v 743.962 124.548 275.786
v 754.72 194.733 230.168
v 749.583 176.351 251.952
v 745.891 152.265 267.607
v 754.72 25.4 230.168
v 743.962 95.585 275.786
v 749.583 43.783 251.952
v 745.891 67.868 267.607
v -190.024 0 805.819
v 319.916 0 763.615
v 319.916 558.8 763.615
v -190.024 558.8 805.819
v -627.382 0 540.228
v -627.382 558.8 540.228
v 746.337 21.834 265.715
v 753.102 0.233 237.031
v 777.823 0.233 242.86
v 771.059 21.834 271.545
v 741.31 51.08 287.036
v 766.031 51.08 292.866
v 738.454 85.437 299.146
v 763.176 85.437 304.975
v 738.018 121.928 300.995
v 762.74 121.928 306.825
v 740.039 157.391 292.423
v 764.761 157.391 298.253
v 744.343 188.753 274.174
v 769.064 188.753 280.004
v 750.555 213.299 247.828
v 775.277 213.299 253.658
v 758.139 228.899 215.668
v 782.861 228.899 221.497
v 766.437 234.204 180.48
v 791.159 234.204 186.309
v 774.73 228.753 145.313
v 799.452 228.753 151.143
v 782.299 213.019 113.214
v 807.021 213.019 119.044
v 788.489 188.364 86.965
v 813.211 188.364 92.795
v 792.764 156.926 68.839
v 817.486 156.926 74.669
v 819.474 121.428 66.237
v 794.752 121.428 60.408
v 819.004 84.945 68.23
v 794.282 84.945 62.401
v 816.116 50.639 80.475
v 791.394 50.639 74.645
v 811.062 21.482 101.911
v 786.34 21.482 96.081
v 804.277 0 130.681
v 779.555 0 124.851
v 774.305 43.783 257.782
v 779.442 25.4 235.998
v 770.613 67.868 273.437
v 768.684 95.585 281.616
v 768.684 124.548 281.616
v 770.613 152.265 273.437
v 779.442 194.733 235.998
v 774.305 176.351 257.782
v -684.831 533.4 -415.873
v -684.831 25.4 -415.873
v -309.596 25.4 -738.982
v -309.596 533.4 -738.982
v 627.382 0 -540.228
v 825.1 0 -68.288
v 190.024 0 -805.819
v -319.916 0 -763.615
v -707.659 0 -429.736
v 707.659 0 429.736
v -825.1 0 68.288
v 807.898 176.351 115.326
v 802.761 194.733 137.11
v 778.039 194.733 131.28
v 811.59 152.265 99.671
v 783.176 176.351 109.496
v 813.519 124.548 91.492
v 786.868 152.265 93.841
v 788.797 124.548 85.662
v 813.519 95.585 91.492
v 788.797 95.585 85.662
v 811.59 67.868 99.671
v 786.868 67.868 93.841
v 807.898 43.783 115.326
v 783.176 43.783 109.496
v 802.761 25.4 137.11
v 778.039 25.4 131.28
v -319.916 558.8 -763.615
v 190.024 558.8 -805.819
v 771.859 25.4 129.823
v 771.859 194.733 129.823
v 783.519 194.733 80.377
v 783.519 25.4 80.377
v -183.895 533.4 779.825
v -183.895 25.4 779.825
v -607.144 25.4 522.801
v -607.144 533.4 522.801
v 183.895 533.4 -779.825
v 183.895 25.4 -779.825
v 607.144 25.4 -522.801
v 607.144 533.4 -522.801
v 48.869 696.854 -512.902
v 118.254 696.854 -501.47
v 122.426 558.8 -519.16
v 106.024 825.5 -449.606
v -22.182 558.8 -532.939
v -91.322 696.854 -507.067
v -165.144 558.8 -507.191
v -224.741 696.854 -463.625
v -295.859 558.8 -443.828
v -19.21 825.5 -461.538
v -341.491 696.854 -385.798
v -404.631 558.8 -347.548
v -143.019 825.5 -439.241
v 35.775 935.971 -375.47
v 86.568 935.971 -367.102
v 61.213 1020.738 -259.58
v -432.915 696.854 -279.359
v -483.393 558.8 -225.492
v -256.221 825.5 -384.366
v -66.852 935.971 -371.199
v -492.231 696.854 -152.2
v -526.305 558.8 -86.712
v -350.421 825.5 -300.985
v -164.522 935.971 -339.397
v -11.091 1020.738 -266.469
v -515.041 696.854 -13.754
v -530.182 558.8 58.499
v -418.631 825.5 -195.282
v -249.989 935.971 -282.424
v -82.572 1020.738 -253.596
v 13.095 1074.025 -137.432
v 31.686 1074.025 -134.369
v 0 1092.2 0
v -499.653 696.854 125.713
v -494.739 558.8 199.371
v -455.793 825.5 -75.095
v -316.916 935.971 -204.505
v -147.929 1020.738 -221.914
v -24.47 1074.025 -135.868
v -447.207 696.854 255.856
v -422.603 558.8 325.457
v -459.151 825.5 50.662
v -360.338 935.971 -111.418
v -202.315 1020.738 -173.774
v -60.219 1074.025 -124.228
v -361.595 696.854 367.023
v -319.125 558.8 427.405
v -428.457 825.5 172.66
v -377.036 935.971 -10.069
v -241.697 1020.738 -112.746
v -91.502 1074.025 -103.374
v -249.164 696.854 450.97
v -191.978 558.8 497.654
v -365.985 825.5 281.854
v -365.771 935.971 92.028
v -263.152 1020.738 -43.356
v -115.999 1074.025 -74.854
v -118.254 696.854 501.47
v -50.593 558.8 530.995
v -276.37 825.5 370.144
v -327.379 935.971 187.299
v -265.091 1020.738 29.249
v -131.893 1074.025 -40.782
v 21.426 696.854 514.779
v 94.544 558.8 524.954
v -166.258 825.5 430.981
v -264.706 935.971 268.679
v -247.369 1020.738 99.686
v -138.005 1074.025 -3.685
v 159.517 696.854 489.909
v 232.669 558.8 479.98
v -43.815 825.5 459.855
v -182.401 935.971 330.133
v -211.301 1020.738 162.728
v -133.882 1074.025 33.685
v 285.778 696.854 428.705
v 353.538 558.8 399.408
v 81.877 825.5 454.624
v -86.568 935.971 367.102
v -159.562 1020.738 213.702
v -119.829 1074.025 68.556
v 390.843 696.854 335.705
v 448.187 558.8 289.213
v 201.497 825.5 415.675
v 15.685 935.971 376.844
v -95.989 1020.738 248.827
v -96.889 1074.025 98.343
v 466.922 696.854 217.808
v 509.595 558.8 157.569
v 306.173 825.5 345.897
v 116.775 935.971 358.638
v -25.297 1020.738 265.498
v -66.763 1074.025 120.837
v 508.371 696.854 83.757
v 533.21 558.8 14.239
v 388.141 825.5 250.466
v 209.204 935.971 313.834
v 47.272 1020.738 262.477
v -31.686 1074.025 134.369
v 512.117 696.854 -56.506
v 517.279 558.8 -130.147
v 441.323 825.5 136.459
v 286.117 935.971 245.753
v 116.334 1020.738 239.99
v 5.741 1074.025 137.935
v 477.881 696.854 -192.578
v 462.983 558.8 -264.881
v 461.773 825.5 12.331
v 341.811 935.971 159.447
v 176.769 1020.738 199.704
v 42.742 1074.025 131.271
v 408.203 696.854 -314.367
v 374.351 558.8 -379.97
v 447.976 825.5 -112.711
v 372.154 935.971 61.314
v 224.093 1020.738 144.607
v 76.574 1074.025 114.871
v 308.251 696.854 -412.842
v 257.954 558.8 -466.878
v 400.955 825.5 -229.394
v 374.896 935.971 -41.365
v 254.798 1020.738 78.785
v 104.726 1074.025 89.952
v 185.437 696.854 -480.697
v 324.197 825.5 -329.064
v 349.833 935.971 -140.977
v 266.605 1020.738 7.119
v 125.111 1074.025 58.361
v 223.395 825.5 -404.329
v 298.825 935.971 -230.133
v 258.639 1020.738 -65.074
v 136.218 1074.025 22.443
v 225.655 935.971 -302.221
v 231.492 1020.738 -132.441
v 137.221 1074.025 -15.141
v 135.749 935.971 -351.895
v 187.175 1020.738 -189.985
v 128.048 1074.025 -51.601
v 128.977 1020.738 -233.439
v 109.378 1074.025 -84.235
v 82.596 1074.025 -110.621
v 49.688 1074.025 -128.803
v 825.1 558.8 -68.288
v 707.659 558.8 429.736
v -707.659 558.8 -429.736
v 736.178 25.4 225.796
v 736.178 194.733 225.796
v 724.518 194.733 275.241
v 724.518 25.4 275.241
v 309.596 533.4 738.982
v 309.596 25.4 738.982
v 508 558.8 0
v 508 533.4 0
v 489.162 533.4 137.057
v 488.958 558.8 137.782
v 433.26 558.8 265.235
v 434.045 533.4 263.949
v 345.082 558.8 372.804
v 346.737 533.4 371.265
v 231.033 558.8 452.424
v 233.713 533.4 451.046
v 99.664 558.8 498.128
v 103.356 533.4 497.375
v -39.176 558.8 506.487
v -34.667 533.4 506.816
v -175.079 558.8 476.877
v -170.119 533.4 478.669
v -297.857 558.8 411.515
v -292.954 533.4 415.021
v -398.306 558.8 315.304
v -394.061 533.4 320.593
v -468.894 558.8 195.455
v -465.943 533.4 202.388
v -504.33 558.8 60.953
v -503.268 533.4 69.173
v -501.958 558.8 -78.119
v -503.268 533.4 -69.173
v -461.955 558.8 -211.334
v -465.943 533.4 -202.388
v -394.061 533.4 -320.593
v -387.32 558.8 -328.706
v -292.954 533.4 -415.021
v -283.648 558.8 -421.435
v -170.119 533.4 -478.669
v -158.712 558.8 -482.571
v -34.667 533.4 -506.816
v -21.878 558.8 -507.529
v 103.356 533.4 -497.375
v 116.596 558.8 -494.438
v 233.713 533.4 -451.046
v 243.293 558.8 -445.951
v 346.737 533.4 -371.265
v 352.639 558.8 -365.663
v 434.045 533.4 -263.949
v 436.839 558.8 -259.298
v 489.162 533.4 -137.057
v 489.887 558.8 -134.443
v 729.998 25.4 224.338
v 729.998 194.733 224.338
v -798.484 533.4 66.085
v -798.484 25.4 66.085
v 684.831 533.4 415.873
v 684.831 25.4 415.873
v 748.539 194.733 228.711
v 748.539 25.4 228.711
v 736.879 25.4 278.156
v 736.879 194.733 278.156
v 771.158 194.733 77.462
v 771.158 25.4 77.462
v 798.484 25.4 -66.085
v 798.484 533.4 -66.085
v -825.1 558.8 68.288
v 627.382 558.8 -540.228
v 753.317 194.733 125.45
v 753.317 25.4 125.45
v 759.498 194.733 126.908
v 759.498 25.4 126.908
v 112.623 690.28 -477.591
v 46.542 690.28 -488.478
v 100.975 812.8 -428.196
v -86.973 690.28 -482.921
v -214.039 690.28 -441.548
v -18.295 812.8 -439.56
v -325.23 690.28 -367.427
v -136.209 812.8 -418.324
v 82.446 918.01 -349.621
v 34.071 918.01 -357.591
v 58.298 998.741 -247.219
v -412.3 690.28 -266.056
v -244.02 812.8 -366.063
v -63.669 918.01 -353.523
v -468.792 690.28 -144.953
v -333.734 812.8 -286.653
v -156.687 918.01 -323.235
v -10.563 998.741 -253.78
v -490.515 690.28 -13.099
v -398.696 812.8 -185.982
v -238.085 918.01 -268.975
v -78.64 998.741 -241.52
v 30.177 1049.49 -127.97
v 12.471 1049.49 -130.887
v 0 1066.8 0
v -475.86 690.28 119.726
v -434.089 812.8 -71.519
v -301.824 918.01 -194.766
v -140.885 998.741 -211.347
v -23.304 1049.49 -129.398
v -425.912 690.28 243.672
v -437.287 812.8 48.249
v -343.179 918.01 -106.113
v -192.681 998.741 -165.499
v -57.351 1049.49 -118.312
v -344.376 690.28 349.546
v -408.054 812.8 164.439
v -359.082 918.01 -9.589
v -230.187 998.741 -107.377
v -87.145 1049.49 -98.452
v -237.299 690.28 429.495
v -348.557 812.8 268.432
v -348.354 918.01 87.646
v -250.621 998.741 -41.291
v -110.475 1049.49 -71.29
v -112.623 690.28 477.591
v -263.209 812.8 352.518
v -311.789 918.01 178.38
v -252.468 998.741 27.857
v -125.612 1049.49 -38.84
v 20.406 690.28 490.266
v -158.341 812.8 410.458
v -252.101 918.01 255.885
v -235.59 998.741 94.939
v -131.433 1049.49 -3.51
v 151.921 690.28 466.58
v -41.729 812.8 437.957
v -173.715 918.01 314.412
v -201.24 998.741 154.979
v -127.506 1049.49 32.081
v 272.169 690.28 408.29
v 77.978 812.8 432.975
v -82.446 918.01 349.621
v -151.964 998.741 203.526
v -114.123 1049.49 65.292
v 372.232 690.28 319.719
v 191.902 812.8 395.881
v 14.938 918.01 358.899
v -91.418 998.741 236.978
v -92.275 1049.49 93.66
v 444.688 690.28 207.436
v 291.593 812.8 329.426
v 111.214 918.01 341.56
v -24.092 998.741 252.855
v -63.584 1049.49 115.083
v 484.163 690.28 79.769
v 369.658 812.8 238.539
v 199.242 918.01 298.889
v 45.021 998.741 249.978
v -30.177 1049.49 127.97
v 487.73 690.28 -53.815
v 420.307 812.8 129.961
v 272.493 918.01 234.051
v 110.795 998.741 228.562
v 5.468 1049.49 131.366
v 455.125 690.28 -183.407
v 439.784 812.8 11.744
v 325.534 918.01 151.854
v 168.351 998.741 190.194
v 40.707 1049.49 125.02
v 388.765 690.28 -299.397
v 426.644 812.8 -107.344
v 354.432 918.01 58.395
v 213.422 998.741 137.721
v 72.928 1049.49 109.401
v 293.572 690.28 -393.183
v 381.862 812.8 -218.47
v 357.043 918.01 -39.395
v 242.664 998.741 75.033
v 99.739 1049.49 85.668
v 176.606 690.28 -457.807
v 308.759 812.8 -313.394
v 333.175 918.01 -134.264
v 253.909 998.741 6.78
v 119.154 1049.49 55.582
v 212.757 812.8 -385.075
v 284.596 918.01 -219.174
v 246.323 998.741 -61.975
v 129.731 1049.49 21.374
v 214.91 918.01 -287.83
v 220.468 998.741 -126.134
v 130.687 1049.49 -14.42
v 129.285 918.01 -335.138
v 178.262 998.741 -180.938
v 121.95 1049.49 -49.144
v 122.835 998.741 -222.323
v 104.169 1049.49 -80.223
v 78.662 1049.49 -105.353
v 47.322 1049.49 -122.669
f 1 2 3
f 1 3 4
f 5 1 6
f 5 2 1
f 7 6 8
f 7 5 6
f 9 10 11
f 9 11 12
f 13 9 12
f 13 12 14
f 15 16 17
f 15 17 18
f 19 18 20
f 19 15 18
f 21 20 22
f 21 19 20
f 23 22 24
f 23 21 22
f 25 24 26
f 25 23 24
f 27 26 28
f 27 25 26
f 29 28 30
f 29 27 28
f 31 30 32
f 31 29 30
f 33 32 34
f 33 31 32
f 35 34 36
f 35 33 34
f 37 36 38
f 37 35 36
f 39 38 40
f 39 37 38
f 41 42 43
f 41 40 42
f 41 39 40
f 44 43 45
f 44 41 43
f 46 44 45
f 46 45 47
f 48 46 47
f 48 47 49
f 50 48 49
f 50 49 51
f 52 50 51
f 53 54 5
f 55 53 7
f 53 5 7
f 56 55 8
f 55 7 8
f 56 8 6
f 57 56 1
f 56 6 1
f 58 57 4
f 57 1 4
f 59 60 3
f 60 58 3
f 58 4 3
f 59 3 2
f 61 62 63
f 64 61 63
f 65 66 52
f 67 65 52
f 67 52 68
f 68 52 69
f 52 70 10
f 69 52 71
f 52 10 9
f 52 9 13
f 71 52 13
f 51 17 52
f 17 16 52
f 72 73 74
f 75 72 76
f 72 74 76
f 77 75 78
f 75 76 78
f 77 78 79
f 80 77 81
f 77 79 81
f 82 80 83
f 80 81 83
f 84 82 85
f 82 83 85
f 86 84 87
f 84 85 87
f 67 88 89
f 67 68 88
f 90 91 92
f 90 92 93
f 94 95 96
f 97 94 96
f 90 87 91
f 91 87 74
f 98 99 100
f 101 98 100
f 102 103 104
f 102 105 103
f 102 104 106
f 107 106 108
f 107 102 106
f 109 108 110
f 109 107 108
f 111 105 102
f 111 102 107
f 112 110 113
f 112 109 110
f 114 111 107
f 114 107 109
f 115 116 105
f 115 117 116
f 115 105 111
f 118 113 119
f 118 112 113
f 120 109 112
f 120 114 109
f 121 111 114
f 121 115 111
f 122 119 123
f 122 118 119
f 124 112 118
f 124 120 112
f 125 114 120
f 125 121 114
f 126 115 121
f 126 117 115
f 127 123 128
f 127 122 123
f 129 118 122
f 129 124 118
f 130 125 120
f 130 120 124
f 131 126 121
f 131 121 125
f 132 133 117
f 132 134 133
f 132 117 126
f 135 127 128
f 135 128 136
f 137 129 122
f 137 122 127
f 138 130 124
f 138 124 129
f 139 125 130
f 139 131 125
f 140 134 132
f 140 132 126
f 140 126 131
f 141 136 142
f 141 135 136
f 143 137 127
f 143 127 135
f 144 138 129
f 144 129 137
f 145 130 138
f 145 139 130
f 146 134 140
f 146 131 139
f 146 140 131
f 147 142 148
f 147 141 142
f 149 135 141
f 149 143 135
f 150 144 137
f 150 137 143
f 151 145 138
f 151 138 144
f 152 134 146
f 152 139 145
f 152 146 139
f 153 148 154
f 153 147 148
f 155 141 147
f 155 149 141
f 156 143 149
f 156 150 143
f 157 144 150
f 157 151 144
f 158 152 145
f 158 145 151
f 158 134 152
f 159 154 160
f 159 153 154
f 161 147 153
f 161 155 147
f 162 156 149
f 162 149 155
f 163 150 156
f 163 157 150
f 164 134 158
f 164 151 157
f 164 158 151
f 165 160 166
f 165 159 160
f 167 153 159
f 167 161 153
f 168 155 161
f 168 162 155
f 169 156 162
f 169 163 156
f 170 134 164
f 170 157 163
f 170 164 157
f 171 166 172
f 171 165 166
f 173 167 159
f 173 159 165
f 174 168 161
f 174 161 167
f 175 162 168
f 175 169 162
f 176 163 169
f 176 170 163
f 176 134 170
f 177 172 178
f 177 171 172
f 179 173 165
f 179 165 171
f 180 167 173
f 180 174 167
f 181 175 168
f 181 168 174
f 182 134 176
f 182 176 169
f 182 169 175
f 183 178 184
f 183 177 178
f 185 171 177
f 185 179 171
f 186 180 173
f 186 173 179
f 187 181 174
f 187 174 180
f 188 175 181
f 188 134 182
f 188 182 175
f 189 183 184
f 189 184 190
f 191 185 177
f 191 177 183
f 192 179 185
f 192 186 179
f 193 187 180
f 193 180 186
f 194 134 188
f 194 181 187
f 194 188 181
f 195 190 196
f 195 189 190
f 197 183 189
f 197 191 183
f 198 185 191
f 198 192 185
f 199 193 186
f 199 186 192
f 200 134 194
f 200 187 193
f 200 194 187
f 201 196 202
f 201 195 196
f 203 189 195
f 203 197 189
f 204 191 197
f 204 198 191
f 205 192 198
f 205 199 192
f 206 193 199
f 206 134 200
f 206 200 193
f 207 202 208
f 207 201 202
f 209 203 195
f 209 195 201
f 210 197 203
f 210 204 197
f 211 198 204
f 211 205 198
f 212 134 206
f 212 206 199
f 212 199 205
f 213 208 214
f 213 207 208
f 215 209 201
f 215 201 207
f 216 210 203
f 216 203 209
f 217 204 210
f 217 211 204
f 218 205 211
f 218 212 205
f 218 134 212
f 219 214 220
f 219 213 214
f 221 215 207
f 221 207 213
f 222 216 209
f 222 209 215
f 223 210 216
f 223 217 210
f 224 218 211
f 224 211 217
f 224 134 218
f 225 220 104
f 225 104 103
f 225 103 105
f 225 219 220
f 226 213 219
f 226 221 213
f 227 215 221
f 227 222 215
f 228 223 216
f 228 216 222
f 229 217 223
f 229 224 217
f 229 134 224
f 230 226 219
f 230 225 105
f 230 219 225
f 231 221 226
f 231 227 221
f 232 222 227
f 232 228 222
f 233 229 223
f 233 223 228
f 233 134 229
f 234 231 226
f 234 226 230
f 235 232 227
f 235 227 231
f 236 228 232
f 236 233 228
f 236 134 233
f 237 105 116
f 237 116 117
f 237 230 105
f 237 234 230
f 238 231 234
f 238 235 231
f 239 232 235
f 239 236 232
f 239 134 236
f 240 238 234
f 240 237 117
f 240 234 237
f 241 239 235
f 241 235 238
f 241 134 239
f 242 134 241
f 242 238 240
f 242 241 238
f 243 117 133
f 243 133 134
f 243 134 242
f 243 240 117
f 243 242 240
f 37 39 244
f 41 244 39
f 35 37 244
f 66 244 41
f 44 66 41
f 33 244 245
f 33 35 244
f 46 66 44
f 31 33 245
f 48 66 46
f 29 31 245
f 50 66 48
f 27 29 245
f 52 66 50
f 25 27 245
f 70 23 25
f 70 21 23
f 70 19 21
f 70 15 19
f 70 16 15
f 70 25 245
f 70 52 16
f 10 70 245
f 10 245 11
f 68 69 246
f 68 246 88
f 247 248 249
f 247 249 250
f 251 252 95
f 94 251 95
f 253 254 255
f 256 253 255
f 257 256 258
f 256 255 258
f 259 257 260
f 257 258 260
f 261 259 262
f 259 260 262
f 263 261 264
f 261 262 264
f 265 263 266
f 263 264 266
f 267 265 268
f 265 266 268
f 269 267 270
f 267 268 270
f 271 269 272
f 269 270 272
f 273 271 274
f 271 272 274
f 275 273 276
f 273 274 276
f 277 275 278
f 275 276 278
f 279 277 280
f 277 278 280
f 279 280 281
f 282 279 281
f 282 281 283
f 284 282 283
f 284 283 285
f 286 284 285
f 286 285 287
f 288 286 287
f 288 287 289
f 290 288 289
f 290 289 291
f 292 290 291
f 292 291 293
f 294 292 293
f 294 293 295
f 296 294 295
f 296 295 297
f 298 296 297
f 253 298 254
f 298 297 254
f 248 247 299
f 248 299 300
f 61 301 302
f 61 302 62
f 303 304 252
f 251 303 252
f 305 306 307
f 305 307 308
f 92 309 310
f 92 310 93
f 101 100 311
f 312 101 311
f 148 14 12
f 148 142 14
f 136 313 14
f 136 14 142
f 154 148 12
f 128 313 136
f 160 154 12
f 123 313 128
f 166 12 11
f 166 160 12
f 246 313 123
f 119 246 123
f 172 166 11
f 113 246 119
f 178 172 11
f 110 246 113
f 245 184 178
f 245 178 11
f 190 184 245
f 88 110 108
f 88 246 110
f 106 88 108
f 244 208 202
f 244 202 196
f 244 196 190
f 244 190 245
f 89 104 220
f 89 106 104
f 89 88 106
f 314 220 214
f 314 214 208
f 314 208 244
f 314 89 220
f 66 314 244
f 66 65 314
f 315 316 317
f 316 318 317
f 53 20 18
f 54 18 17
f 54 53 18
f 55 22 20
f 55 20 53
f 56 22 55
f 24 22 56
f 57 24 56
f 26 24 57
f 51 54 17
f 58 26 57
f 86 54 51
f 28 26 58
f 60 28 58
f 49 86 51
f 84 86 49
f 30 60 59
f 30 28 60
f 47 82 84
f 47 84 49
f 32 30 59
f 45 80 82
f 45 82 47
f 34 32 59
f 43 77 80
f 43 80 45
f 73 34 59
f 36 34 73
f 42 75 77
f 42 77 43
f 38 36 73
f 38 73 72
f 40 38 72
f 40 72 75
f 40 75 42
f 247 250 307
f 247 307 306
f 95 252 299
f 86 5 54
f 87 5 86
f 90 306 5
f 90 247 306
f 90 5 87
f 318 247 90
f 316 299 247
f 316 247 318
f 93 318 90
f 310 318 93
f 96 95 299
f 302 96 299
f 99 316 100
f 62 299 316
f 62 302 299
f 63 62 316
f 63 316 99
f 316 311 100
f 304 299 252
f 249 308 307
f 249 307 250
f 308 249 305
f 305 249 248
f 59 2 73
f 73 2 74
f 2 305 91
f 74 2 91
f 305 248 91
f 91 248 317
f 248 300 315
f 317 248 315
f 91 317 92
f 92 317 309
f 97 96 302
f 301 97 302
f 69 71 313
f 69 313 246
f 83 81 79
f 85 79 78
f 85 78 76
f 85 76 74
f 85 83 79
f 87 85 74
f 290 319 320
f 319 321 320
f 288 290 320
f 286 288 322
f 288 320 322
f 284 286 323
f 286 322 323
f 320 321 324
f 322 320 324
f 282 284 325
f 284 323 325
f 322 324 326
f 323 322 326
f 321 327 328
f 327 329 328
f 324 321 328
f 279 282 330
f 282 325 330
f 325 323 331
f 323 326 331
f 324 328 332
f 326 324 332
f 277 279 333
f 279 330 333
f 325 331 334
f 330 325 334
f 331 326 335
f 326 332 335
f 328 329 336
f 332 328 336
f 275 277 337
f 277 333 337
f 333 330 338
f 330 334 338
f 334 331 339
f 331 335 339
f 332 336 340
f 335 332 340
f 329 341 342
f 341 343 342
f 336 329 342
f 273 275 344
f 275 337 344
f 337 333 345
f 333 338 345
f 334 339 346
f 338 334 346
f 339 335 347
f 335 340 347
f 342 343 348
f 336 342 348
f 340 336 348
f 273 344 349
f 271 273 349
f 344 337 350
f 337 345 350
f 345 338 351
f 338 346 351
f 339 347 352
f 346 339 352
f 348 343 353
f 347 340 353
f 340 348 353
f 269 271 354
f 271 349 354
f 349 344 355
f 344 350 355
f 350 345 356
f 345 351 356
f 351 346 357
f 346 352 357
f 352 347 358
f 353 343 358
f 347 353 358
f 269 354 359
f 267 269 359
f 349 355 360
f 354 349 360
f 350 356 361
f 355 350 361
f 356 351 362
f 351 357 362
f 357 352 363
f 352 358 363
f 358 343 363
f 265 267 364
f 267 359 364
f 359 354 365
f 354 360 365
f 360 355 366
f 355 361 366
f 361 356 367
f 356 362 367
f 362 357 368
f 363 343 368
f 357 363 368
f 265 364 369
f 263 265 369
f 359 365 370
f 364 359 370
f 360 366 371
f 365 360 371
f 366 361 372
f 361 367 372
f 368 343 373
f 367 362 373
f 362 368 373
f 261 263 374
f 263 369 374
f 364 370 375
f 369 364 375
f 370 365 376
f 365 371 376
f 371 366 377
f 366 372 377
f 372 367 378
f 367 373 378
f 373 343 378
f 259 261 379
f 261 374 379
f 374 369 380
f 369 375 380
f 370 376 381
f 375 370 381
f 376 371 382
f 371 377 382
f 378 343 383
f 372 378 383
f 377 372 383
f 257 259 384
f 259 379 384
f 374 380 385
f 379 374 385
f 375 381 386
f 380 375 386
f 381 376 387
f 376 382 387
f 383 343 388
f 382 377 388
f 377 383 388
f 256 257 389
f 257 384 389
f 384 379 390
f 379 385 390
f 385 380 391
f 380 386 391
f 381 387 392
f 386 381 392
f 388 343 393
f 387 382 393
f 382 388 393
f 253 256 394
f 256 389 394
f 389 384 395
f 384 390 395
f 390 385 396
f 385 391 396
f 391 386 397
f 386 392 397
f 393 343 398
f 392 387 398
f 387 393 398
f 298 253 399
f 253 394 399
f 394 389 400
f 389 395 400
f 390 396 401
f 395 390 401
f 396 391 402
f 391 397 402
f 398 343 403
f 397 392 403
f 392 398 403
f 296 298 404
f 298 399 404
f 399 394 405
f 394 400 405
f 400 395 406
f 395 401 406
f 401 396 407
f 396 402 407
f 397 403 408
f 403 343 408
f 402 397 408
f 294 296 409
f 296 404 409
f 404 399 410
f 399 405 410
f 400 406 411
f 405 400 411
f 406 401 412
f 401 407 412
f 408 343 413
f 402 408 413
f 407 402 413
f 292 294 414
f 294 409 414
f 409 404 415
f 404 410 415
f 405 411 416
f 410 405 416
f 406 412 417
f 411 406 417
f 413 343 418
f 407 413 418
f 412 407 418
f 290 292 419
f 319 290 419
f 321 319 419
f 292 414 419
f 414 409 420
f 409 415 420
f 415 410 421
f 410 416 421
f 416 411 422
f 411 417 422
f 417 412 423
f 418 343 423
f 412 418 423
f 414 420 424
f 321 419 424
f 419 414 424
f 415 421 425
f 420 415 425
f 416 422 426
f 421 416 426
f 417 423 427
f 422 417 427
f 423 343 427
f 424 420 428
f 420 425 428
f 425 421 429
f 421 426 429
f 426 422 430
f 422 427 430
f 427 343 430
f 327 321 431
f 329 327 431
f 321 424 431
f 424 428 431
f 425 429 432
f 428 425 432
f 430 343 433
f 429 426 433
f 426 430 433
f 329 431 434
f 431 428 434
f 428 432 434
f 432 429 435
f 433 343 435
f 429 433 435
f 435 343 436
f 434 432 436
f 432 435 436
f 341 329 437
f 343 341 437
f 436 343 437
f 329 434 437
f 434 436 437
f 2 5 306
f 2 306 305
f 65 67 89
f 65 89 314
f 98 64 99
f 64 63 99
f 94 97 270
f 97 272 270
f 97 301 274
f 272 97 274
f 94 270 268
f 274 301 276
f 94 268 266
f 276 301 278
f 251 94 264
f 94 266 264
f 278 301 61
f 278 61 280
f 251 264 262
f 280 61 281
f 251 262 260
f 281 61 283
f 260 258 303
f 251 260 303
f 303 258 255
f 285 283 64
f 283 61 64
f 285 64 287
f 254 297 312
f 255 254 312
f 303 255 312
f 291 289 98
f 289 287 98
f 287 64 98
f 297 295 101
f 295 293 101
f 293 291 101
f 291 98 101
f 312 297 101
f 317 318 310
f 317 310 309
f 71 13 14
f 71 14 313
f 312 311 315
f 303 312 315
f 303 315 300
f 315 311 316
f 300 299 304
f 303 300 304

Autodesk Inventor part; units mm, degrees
ref_plane "YZ Plane" through (0, 0, 0) normal (1, 0, 0) x (0, 1, 0)
sketch "Sketch1" plane through (0, 0, 0) normal (0, 1, 0) x (-1, 0, 0)
  line L0 (707.6587, -429.7359) -> (319.9155, -763.615)
  line L1 (319.9155, -763.615) -> (-190.0245, -805.8191)
  line L2 (-190.0245, -805.8191) -> (-627.3817, -540.2278)
  line L3 (-627.3817, -540.2278) -> (-825.1003, -68.2877)
  line L4 (-825.1003, -68.2877) -> (-707.6587, 429.7359)
  line L5 (-707.6587, 429.7359) -> (-319.9155, 763.615)
  line L6 (-319.9155, 763.615) -> (190.0245, 805.8191)
  line L7 (190.0245, 805.8191) -> (627.3817, 540.2278)
  line L8 (627.3817, 540.2278) -> (825.1003, 68.2877)
  line L9 (825.1003, 68.2877) -> (707.6587, -429.7359)
  point P0 (0, 0)
  point P1 (0, 0)
  dimension "d0" = 1574.8
extrude "bace" add sketch "Sketch1" along normal blind 25.4
sketch "Sketch2" plane through (0, 25.4, 0) normal (0, 1, 0) x (1, 0, 0)
  line L0 (-319.9155, 763.615) -> (-707.6587, 429.7359) projected
  line L1 (-707.6587, 429.7359) -> (-319.9155, 763.615)
  line L2 (-319.9155, 763.615) -> (190.0245, 805.8191)
  line L3 (190.0245, 805.8191) -> (627.3817, 540.2278)
  line L4 (627.3817, 540.2278) -> (825.1003, 68.2877)
  line L5 (825.1003, 68.2877) -> (707.6587, -429.7359)
  line L6 (707.6587, -429.7359) -> (319.9155, -763.615)
  line L7 (319.9155, -763.615) -> (-190.0245, -805.8191)
  line L8 (-190.0245, -805.8191) -> (-627.3817, -540.2278)
  line L9 (-627.3817, -540.2278) -> (-825.1003, -68.2877)
  line L10 (-825.1003, -68.2877) -> (-707.6587, 429.7359)
  line L11 (-684.831, 415.8734) -> (-309.5957, 738.9822)
  line L12 (-309.5957, 738.9822) -> (183.8947, 779.825)
  line L13 (183.8947, 779.825) -> (607.1435, 522.8011)
  line L14 (607.1435, 522.8011) -> (798.4842, 66.0849)
  line L15 (798.4842, 66.0849) -> (684.831, -415.8734)
  line L16 (684.831, -415.8734) -> (309.5957, -738.9822)
  line L17 (309.5957, -738.9822) -> (-183.8947, -779.825)
  line L18 (-183.8947, -779.825) -> (-607.1435, -522.8011)
  line L19 (-607.1435, -522.8011) -> (-798.4842, -66.0849)
  line L20 (-798.4842, -66.0849) -> (-684.831, 415.8734)
  line L21 (-707.6587, 429.7359) -> (-825.1003, -68.2877) projected
  point P0 (0, 0)
  point P1 (0, 0)
  point P2 (0, 0)
  dimension "d4" = 25.4
extrude "bace wall" add sketch "Sketch2" along normal blind 508
sketch "Sketch3" plane through (0, 533.4, 0) normal (0, 1, 0) x (1, 0, 0)
  line L0 (-627.3817, -540.2278) -> (-825.1003, -68.2877) projected
  line L1 (-825.1003, -68.2877) -> (-707.6587, 429.7359)
  line L2 (-707.6587, 429.7359) -> (-319.9155, 763.615)
  line L3 (-319.9155, 763.615) -> (190.0245, 805.8191)
  line L4 (190.0245, 805.8191) -> (627.3817, 540.2278)
  line L5 (627.3817, 540.2278) -> (825.1003, 68.2877)
  line L6 (825.1003, 68.2877) -> (707.6587, -429.7359)
  line L7 (707.6587, -429.7359) -> (319.9155, -763.615)
  line L8 (319.9155, -763.615) -> (-190.0245, -805.8191)
  line L9 (-190.0245, -805.8191) -> (-627.3817, -540.2278)
  line L10 (-627.3817, -540.2278) -> (-825.1003, -68.2877)
  circle A0 centre (0, 0) radius 508
  point P0 (-798.4842, -66.0849)
  dimension "d28" = 1016
extrude "bace cieiling" add sketch "Sketch3" along normal blind 25.4
ref_plane "dome work plane" through (56.8266, 25.4, -240.9792) normal (0.9733039, 0, 0.22952) x (0.22952, 0, -0.9733039)
sketch "Sketch10" plane through (56.8266, 25.4, -240.9792) normal (0.9733039, 0, 0.22952) x (0.22952, 0, -0.9733039)
  line L0 (285.8112, 533.4) -> (260.4112, 533.4)
  line L1 (-755.5888, 533.4) -> (260.4112, 533.4) projected
  arc A0 (260.4112, 533.4) -> (-247.5888, 1041.4) centre (-247.5888, 533.4) ccw
  arc A1 (285.8112, 533.4) -> (-247.5888, 1066.8) centre (-247.5888, 533.4) ccw
  line L2 (-247.5888, 1066.8) -> (-247.5888, 1041.4)
  line L3 (-247.5888, 1041.4) -> (-247.5888, 533.4) construction
  point P0 (-247.5888, -25.4)
  dimension "d32" = 508
  dimension "d33" = 533.4
revolve "dome" add sketch "Sketch10" angle 360 about axis through (0, 1066.8, 0) along (0, -1, 0)
sketch "Sketch8" plane through (825.1003, 0, -68.2877) normal (0.9733039, 0, 0.22952) x (0.22952, 0, -0.9733039)
  line L0 (-255.8418, 25.4) -> (-205.0418, 25.4)
  line L1 (-205.0418, 25.4) -> (-205.0418, 194.7333)
  line L2 (-205.0418, 194.7333) -> (-255.8418, 194.7333)
  line L3 (-255.8418, 194.7333) -> (-255.8418, 25.4)
  line L4 (-255.8418, 25.4) -> (-306.6418, 25.4)
  line L5 (-306.6418, 25.4) -> (-306.6418, 194.7333)
  line L6 (-306.6418, 194.7333) -> (-255.8418, 194.7333)
  line L7 (-503.4306, 25.4) -> (-8.253, 25.4) projected
  point P0 (-255.8418, 0)
  point P1 (-255.8418, 25.4)
  dimension "d16" = 50.8
  dimension "d17" = 169.3333
extrude "door frame" cut sketch "Sketch8" against normal blind 25.4
sketch "Sketch7" plane through (825.1003, 0, -68.2877) normal (0.9733039, 0, 0.22952) x (0.22952, 0, -0.9733039)
  line L0 (-306.6418, 194.7333) -> (-205.0418, 194.7333)
  line L1 (-306.6418, 25.4) -> (-205.0418, 25.4)
  arc A0 (-198.4359, 0) -> (-313.6926, 0.2332) centre (-255.8418, 110.0667) ccw
  arc A1 (-306.6418, 194.7333) -> (-306.6418, 25.4) centre (-255.8418, 110.0667) ccw
  arc A2 (-205.0418, 25.4) -> (-205.0418, 194.7333) centre (-255.8418, 110.0667) ccw
  line L2 (-306.6418, 194.7333) -> (-205.0418, 194.7333)
  line L3 (-306.6418, 194.7333) -> (-306.6418, 25.4)
  line L4 (-313.6926, 0.2332) -> (-198.4359, 0)
  point P0 (-255.8418, 0)
  point P1 (-255.8418, 194.7333)
  point P2 (-306.6418, 110.0667)
  point P3 (-255.8418, 110.0667)
  point P4 (-256.0642, 0.1166)
  dimension "d14" = 169.3333
  dimension "d15" = 101.6
extrude "corridor connection" add sketch "Sketch7" along normal blind 25.4
sketch "Sketch9" plane through (729.998, 25.4, 224.3381) normal (0.22952, 0, -0.9733039) x (-0.9733039, 0, -0.22952)
  line L0 (-12.7, 169.3333) -> (-6.35, 169.3333)
  line L1 (-6.35, 169.3333) -> (-6.35, 0)
  line L2 (-6.35, 0) -> (-19.05, 0)
  line L3 (-19.05, 0) -> (-19.05, 169.3333)
  line L4 (-12.7, 169.3333) -> (-19.05, 169.3333)
  line L5 (-25.4, -25.4) -> (-25.4, 208.8041) projected
  point P0 (762, -25.4)
  point P1 (-25.4, -25.4)
  point P2 (-25.4, 169.3333)
  point P3 (0, 169.3333)
  point P4 (-25.4, 0)
  point P5 (0, 0)
  point P6 (-25.4, 169.3333)
  point P7 (-25.4, -25.1668)
  dimension "d22" = 6.35
  dimension "d23" = 12.7
  dimension "d24" = 169.3333
extrude "left door slot" cut sketch "Sketch9" against normal blind 50.8
ref_plane "door slot mirror" through (766.3795, 25.4, 180.7241) normal (0.22952, 0, -0.9733039) x (-0.9733039, 0, -0.22952)
mirror "Mirror1" about plane through (766.3795, 25.4, 180.7241) normal (0.22952, 0, -0.9733039) of "left door slot"
properties part number "dome"
